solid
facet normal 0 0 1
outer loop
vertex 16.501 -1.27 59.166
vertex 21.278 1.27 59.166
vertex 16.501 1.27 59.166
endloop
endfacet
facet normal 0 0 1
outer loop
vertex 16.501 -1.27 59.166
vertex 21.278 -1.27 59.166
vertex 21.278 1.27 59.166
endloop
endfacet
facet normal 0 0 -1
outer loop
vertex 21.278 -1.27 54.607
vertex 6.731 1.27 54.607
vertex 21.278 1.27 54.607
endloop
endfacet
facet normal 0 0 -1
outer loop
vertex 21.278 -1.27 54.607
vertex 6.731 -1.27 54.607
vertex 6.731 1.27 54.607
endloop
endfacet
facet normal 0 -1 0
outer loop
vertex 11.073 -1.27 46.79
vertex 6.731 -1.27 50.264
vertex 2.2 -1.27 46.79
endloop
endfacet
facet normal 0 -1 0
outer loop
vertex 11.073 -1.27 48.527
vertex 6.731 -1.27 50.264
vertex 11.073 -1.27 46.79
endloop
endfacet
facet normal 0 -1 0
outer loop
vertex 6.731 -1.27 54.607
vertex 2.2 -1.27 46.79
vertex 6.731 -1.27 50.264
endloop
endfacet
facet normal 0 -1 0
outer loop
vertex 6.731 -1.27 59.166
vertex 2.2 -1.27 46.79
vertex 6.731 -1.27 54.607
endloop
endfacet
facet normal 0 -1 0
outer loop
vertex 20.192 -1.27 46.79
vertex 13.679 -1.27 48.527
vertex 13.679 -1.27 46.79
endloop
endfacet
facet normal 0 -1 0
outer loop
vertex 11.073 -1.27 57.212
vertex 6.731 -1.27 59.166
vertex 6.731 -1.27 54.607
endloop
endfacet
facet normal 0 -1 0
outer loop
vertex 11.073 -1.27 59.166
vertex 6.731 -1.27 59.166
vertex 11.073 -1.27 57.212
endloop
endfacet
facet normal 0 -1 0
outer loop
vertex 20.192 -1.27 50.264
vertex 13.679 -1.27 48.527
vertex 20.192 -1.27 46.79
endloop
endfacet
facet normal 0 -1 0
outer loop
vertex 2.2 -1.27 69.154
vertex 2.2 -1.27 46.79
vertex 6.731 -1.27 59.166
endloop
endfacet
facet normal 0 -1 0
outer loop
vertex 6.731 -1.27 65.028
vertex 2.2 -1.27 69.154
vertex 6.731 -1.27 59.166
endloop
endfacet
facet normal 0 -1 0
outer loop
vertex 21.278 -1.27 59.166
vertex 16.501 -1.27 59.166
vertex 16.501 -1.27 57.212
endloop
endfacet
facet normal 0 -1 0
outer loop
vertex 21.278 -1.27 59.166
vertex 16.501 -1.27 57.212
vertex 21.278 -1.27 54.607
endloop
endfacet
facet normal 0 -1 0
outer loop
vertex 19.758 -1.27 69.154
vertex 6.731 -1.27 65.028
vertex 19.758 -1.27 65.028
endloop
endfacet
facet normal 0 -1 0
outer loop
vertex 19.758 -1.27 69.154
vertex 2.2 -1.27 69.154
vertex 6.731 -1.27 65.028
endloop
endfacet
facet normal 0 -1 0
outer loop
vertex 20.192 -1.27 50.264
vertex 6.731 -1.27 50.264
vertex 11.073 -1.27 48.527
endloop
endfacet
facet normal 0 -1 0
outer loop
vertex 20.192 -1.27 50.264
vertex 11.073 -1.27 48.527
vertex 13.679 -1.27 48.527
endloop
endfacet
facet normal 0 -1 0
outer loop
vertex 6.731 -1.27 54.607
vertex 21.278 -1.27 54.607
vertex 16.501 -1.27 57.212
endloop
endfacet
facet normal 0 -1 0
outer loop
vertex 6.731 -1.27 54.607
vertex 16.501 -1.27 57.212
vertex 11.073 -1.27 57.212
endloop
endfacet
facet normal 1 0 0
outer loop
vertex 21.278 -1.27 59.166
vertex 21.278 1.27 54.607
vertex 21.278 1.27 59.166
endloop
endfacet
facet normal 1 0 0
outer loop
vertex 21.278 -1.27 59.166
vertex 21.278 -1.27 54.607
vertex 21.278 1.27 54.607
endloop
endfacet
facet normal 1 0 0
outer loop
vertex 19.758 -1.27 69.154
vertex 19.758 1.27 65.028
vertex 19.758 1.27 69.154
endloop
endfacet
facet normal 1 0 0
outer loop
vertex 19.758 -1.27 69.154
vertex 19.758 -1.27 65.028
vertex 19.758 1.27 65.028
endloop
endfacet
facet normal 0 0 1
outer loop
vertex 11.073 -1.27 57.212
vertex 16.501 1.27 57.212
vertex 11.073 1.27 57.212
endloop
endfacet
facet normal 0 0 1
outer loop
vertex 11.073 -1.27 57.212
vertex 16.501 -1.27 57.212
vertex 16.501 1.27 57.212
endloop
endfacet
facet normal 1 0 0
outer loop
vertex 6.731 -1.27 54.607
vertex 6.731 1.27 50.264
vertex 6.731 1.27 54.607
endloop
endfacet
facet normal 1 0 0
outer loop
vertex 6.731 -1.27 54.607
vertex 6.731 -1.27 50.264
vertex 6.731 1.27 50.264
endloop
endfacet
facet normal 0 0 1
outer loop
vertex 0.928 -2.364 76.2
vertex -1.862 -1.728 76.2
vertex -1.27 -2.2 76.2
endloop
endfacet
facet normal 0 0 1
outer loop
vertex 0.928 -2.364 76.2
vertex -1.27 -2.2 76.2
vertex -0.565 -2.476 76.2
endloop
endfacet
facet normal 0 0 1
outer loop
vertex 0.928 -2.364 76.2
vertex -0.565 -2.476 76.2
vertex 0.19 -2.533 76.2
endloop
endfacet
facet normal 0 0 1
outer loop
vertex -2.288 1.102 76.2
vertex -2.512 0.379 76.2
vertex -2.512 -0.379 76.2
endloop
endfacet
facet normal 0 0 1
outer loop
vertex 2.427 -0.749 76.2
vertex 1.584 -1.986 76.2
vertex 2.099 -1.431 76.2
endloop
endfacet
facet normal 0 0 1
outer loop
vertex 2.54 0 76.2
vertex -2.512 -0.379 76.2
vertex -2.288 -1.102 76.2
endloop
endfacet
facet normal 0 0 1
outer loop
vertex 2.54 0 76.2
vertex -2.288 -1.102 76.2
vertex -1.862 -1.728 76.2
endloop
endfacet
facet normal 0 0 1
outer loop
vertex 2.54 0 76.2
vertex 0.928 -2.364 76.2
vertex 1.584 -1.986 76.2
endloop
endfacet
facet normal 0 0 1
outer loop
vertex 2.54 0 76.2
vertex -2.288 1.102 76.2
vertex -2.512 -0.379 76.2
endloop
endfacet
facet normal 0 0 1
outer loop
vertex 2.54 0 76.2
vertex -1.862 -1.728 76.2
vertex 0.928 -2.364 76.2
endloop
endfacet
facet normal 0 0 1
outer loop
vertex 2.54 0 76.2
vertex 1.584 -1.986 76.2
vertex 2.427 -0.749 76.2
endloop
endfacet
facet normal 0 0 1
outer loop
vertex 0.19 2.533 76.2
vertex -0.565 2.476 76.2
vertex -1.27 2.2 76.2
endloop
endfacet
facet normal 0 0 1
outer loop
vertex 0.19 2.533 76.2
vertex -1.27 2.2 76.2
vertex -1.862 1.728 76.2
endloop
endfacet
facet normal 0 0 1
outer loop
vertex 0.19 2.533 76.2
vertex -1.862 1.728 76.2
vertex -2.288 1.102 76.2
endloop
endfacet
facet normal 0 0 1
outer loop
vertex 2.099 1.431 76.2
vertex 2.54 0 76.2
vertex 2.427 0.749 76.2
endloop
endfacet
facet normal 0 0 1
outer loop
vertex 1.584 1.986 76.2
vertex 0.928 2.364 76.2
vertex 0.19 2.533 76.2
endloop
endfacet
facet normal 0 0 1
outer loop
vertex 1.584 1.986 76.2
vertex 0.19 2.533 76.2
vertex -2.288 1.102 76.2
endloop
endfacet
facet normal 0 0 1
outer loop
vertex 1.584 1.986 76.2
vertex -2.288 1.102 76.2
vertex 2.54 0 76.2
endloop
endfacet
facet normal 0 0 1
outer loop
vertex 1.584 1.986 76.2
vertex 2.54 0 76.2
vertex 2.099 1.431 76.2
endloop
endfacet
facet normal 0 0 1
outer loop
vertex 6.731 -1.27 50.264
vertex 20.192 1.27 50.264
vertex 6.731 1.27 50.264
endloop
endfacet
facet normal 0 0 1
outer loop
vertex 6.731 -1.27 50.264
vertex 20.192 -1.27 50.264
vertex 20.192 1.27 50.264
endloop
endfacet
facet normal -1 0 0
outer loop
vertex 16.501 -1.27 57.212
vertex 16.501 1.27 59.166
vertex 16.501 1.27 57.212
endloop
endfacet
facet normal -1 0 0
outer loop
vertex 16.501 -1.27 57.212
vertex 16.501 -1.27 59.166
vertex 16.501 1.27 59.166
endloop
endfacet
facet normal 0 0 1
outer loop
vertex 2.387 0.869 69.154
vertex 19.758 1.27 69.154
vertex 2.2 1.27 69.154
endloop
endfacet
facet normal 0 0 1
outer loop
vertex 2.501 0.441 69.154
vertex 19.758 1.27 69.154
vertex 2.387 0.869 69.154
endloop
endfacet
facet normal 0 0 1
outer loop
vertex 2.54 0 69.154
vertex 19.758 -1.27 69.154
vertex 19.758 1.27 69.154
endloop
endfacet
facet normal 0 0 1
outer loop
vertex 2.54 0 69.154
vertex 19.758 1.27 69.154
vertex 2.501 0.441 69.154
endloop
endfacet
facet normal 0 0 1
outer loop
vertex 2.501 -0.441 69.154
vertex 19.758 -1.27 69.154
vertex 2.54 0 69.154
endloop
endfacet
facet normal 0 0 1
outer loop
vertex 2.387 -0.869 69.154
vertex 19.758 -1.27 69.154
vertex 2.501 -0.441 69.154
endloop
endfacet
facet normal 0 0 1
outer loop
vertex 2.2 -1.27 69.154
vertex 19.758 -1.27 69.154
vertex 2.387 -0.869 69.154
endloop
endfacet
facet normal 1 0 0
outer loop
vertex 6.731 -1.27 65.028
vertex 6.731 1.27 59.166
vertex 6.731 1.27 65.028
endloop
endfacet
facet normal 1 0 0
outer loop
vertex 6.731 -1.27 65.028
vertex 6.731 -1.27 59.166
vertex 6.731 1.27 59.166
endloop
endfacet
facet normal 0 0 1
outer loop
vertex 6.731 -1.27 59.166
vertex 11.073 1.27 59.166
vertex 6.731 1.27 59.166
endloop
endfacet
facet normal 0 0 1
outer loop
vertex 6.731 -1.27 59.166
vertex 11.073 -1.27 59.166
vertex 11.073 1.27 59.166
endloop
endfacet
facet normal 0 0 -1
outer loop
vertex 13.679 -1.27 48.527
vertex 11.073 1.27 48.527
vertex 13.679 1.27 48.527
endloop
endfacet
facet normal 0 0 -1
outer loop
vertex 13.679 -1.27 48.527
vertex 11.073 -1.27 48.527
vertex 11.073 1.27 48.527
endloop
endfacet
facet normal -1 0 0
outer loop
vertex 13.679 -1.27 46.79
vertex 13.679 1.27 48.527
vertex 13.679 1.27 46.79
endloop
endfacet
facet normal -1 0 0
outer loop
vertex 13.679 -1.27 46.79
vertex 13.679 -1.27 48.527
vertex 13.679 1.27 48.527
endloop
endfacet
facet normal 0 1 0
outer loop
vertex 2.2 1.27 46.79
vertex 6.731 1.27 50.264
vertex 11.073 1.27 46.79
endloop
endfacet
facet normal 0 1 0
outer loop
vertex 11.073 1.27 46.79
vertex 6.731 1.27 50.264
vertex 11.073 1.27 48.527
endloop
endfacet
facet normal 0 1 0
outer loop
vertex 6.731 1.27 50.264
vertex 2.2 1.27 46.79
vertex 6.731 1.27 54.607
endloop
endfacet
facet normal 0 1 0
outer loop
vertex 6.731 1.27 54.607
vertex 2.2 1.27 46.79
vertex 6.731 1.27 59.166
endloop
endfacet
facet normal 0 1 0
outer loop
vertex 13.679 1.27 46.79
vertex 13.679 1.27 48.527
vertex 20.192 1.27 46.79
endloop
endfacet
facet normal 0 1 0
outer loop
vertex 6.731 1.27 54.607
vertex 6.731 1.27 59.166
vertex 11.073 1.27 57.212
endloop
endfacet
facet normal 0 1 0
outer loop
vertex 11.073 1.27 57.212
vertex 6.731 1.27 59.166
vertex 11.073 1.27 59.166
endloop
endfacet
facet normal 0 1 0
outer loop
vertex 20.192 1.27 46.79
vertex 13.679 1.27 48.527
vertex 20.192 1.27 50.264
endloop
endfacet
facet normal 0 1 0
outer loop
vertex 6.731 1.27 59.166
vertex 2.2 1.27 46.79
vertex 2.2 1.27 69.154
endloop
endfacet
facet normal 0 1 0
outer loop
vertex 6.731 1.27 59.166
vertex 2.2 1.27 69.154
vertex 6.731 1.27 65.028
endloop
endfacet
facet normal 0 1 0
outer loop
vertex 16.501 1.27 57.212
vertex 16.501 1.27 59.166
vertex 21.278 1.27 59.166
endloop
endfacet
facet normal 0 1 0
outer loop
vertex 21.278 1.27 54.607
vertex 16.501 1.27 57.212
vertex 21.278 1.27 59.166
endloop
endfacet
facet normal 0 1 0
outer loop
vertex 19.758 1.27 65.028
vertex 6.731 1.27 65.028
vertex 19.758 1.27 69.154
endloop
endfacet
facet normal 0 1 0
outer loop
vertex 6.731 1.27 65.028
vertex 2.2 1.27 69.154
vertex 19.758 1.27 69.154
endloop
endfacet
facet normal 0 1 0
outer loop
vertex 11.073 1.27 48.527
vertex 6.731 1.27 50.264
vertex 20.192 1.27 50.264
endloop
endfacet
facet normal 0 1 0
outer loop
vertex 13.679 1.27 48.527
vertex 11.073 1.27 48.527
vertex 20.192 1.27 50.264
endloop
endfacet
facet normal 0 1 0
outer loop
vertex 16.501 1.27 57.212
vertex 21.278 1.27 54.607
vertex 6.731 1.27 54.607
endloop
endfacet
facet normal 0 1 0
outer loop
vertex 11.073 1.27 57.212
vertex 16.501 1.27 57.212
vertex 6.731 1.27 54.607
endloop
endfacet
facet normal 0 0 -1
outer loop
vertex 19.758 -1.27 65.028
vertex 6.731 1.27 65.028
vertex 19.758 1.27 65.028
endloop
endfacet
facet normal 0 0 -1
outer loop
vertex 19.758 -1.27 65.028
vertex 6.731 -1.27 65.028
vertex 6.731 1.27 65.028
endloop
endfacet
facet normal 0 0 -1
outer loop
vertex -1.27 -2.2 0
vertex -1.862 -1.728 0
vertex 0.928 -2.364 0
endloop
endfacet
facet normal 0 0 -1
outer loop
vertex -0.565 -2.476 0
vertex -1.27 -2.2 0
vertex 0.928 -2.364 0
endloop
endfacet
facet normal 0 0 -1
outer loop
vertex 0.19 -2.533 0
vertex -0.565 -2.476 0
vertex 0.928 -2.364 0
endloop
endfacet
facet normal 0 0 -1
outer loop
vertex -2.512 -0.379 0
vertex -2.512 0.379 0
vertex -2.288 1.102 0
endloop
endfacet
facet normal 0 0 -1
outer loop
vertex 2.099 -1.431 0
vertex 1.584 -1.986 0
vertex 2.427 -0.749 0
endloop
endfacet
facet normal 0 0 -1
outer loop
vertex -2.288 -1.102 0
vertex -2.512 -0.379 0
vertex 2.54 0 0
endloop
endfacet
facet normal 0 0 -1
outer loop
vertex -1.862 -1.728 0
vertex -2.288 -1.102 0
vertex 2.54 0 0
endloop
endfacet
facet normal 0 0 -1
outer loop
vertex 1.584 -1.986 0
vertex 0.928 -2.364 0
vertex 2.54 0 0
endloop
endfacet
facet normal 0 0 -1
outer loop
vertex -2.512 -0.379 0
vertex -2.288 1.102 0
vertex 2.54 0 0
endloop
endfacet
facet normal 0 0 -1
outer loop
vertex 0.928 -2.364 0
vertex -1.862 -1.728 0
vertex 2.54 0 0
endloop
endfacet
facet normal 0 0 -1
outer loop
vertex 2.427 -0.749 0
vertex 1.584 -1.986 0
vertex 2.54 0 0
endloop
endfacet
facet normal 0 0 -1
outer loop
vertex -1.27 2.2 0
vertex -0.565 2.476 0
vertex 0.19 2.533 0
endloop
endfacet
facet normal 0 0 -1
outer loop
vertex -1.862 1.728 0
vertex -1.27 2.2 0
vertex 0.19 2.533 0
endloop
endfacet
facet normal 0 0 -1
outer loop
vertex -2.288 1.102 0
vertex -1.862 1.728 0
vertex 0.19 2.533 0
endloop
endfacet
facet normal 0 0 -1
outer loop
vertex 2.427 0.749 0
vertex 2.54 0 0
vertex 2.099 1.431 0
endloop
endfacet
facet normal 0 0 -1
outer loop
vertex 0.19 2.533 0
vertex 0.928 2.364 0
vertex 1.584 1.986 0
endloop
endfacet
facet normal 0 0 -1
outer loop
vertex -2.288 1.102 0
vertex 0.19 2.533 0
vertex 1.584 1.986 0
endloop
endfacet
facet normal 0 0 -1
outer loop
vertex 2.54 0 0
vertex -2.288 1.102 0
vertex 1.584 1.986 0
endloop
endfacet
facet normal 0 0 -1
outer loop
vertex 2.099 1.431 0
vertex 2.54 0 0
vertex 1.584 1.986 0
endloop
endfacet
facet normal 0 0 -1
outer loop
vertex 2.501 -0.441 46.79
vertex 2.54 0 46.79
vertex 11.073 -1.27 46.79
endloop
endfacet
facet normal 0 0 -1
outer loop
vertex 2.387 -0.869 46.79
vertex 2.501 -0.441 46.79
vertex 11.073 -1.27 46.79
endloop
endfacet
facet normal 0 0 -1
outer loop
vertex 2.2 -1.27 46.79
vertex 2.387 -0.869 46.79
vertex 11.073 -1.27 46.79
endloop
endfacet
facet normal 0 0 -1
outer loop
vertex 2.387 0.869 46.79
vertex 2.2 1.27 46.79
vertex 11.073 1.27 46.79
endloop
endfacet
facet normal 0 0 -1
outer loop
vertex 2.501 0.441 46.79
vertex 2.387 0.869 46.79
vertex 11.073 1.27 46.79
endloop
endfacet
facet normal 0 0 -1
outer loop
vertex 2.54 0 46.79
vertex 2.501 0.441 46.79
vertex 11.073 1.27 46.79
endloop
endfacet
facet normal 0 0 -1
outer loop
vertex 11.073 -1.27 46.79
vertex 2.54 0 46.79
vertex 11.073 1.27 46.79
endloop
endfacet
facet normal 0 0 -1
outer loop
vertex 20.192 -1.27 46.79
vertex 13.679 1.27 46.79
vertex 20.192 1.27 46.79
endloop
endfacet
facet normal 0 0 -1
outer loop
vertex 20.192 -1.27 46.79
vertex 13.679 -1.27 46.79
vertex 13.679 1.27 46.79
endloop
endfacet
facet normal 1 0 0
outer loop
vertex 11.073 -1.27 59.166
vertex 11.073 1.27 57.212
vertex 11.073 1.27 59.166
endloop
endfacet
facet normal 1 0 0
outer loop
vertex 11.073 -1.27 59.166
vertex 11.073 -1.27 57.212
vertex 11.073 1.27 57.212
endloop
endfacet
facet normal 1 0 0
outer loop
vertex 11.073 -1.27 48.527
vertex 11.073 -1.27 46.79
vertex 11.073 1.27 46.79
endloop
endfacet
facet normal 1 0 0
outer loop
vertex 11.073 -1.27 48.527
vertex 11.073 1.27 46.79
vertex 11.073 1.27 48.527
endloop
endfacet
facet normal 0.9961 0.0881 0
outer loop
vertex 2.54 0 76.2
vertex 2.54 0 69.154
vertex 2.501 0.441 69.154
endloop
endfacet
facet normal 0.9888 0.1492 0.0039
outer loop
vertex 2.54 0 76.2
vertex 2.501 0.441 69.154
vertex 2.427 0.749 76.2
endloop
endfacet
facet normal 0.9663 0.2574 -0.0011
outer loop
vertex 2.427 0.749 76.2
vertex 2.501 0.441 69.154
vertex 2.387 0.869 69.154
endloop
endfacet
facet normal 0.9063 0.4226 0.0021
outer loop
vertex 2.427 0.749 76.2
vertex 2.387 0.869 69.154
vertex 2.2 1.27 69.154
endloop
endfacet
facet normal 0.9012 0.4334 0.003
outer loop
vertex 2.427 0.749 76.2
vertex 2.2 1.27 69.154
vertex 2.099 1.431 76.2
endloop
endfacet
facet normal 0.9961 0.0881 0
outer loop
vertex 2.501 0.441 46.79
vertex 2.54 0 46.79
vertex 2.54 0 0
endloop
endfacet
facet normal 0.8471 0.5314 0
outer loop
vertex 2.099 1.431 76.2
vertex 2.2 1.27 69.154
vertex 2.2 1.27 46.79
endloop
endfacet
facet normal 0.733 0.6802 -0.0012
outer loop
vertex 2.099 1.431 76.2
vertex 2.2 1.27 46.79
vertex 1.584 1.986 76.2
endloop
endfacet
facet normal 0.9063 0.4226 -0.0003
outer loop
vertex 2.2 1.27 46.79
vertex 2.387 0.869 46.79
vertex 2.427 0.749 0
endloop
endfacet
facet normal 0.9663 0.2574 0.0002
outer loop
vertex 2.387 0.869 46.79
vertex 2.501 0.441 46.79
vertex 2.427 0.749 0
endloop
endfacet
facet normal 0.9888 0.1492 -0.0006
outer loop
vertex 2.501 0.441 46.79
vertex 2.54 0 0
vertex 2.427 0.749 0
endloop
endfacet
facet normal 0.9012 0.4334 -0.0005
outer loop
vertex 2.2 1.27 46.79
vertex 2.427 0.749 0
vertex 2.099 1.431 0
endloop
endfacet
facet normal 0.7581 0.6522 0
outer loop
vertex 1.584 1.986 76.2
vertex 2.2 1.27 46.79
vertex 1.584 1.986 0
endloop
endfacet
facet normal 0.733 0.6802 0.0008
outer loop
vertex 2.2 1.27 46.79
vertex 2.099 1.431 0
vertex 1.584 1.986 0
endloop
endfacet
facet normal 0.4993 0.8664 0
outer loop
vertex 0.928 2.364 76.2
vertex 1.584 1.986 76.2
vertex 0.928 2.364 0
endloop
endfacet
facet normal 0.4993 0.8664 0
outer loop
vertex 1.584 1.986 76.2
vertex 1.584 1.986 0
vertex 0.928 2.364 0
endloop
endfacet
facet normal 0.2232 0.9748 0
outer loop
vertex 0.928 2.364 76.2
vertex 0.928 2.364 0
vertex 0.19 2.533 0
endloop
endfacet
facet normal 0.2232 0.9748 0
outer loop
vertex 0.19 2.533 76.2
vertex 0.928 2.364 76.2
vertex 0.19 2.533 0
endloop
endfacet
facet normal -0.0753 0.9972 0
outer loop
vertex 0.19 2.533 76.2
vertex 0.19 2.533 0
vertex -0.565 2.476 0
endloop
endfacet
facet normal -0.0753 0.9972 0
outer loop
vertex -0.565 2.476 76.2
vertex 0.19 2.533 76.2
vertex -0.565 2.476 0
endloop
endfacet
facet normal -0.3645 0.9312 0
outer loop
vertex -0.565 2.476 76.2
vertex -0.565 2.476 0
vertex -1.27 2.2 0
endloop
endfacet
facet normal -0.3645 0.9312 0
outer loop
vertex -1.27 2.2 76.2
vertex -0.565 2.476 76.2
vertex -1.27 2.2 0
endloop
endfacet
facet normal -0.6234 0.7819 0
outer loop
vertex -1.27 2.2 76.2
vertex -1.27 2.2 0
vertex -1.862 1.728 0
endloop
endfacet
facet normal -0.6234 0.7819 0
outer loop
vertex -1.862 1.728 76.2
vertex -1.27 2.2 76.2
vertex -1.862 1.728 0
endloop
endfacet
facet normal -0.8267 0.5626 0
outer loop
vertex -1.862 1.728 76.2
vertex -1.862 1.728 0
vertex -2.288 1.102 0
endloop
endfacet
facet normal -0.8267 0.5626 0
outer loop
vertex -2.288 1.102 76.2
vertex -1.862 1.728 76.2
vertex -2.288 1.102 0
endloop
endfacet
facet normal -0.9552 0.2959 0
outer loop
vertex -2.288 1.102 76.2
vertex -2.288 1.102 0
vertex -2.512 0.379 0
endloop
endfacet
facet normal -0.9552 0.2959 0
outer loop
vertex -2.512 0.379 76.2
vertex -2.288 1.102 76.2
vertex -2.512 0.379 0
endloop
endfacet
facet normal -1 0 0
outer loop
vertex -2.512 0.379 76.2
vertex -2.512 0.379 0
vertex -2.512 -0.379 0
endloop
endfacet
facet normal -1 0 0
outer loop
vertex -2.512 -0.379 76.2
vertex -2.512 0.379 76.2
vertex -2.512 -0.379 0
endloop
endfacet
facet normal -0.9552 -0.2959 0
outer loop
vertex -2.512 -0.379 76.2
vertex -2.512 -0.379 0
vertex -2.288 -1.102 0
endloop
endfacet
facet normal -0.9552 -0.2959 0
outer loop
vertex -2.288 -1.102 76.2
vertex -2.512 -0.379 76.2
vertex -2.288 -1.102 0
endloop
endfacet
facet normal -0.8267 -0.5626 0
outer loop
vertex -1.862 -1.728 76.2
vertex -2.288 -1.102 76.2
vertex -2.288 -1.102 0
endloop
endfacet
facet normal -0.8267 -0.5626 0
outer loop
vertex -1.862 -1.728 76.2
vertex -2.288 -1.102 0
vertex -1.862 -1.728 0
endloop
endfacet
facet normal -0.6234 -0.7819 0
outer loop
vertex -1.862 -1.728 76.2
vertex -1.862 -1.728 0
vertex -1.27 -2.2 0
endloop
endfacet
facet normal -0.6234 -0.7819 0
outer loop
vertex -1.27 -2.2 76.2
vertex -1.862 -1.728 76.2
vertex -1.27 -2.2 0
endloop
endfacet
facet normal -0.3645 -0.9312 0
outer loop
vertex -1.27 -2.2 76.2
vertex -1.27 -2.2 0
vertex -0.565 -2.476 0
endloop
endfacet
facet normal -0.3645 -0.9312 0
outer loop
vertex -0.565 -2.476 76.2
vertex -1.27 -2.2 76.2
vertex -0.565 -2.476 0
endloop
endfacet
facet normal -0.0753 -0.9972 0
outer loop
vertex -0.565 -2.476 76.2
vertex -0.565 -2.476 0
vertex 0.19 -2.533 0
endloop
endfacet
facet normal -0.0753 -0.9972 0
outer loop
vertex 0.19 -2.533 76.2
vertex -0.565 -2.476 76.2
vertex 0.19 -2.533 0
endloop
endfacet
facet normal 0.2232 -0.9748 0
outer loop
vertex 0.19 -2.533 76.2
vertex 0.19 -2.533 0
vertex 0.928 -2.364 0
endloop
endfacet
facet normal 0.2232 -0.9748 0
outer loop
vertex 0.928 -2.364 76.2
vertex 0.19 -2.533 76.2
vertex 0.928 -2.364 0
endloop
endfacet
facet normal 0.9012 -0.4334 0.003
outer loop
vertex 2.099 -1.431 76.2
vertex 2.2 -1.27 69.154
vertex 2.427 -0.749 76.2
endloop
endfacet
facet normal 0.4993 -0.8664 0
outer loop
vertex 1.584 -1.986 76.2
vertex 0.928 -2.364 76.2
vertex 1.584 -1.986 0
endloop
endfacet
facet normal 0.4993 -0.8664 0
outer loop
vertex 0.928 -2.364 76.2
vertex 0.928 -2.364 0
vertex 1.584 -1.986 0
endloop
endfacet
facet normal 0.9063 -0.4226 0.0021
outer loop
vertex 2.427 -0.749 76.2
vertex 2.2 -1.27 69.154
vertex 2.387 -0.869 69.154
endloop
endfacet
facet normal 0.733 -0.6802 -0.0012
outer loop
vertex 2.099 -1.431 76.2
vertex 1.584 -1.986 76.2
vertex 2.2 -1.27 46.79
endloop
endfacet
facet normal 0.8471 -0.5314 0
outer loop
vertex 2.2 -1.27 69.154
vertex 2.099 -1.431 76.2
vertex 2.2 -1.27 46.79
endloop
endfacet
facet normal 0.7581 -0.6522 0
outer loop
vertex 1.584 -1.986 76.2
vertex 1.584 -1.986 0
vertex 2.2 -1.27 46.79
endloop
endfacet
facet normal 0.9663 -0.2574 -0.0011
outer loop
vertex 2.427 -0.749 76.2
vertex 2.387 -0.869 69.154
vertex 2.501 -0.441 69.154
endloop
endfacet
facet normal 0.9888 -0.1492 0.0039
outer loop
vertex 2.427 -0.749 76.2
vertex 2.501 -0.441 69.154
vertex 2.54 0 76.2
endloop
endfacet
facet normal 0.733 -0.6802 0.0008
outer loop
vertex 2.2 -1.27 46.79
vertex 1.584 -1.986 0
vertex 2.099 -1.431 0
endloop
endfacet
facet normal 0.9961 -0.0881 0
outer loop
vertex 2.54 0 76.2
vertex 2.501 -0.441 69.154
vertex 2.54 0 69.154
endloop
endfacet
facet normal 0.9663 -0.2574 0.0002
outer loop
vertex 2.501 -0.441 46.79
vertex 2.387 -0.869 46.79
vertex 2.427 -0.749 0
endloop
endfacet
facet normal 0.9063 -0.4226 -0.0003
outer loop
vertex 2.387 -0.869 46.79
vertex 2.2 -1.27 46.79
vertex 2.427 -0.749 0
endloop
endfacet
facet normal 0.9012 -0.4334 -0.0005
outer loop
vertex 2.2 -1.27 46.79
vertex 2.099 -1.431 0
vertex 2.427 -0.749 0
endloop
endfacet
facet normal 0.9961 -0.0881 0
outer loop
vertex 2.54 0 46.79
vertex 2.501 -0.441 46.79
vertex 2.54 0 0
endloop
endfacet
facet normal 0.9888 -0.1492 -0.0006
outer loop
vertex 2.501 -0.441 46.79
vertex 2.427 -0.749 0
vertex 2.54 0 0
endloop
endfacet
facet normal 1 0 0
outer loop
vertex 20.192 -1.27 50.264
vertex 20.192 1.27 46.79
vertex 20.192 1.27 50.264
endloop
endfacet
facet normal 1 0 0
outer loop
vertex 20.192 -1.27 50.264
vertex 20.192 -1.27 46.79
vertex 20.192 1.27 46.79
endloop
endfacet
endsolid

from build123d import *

# Parameters (mm, degrees)
F0_R     = 2.54
F1_DEPTH = 76.2
F3_DEPTH = 1.27
F4_DEPTH = 1.27


with BuildPart() as f1:
    # F0 (on Top) → F1 (new body)
    with BuildSketch(Plane.XY):
        Circle(F0_R)
    extrude(amount=F1_DEPTH)

    # F2 (on Front) → F3 (join)
    with BuildSketch(Plane.XZ):
        Polygon((19.7582356632, 69.153830409), (0, 69.153830409), (0, 46.79011181), (11.0732968897, 46.79011181), (11.0732968897, 48.5270991921), (13.6787788942, 48.5270991921), (13.6787788942, 46.79011181), (20.19248344, 46.79011181), (20.19248344, 50.2640865743), (6.7308279686, 50.2640865743), (6.7308279686, 54.6065531671), (21.2781019509, 54.6065531671), (21.2781019509, 59.1661445796), (16.5013838559, 59.1661445796), (16.5013838559, 57.212036103), (11.0732968897, 57.212036103), (11.0732968897, 59.1661445796), (6.7308279686, 59.1661445796), (6.7308279686, 65.0284811854), (19.7582356632, 65.0284811854), align=None)
    extrude(amount=F3_DEPTH)

    # F2 (on Front) → F4 (join)
    with BuildSketch(Plane.XZ):
        Polygon((19.7582356632, 69.153830409), (0, 69.153830409), (0, 46.79011181), (11.0732968897, 46.79011181), (11.0732968897, 48.5270991921), (13.6787788942, 48.5270991921), (13.6787788942, 46.79011181), (20.19248344, 46.79011181), (20.19248344, 50.2640865743), (6.7308279686, 50.2640865743), (6.7308279686, 54.6065531671), (21.2781019509, 54.6065531671), (21.2781019509, 59.1661445796), (16.5013838559, 59.1661445796), (16.5013838559, 57.212036103), (11.0732968897, 57.212036103), (11.0732968897, 59.1661445796), (6.7308279686, 59.1661445796), (6.7308279686, 65.0284811854), (19.7582356632, 65.0284811854), align=None)
    extrude(amount=-F4_DEPTH)


solid = f1.part
